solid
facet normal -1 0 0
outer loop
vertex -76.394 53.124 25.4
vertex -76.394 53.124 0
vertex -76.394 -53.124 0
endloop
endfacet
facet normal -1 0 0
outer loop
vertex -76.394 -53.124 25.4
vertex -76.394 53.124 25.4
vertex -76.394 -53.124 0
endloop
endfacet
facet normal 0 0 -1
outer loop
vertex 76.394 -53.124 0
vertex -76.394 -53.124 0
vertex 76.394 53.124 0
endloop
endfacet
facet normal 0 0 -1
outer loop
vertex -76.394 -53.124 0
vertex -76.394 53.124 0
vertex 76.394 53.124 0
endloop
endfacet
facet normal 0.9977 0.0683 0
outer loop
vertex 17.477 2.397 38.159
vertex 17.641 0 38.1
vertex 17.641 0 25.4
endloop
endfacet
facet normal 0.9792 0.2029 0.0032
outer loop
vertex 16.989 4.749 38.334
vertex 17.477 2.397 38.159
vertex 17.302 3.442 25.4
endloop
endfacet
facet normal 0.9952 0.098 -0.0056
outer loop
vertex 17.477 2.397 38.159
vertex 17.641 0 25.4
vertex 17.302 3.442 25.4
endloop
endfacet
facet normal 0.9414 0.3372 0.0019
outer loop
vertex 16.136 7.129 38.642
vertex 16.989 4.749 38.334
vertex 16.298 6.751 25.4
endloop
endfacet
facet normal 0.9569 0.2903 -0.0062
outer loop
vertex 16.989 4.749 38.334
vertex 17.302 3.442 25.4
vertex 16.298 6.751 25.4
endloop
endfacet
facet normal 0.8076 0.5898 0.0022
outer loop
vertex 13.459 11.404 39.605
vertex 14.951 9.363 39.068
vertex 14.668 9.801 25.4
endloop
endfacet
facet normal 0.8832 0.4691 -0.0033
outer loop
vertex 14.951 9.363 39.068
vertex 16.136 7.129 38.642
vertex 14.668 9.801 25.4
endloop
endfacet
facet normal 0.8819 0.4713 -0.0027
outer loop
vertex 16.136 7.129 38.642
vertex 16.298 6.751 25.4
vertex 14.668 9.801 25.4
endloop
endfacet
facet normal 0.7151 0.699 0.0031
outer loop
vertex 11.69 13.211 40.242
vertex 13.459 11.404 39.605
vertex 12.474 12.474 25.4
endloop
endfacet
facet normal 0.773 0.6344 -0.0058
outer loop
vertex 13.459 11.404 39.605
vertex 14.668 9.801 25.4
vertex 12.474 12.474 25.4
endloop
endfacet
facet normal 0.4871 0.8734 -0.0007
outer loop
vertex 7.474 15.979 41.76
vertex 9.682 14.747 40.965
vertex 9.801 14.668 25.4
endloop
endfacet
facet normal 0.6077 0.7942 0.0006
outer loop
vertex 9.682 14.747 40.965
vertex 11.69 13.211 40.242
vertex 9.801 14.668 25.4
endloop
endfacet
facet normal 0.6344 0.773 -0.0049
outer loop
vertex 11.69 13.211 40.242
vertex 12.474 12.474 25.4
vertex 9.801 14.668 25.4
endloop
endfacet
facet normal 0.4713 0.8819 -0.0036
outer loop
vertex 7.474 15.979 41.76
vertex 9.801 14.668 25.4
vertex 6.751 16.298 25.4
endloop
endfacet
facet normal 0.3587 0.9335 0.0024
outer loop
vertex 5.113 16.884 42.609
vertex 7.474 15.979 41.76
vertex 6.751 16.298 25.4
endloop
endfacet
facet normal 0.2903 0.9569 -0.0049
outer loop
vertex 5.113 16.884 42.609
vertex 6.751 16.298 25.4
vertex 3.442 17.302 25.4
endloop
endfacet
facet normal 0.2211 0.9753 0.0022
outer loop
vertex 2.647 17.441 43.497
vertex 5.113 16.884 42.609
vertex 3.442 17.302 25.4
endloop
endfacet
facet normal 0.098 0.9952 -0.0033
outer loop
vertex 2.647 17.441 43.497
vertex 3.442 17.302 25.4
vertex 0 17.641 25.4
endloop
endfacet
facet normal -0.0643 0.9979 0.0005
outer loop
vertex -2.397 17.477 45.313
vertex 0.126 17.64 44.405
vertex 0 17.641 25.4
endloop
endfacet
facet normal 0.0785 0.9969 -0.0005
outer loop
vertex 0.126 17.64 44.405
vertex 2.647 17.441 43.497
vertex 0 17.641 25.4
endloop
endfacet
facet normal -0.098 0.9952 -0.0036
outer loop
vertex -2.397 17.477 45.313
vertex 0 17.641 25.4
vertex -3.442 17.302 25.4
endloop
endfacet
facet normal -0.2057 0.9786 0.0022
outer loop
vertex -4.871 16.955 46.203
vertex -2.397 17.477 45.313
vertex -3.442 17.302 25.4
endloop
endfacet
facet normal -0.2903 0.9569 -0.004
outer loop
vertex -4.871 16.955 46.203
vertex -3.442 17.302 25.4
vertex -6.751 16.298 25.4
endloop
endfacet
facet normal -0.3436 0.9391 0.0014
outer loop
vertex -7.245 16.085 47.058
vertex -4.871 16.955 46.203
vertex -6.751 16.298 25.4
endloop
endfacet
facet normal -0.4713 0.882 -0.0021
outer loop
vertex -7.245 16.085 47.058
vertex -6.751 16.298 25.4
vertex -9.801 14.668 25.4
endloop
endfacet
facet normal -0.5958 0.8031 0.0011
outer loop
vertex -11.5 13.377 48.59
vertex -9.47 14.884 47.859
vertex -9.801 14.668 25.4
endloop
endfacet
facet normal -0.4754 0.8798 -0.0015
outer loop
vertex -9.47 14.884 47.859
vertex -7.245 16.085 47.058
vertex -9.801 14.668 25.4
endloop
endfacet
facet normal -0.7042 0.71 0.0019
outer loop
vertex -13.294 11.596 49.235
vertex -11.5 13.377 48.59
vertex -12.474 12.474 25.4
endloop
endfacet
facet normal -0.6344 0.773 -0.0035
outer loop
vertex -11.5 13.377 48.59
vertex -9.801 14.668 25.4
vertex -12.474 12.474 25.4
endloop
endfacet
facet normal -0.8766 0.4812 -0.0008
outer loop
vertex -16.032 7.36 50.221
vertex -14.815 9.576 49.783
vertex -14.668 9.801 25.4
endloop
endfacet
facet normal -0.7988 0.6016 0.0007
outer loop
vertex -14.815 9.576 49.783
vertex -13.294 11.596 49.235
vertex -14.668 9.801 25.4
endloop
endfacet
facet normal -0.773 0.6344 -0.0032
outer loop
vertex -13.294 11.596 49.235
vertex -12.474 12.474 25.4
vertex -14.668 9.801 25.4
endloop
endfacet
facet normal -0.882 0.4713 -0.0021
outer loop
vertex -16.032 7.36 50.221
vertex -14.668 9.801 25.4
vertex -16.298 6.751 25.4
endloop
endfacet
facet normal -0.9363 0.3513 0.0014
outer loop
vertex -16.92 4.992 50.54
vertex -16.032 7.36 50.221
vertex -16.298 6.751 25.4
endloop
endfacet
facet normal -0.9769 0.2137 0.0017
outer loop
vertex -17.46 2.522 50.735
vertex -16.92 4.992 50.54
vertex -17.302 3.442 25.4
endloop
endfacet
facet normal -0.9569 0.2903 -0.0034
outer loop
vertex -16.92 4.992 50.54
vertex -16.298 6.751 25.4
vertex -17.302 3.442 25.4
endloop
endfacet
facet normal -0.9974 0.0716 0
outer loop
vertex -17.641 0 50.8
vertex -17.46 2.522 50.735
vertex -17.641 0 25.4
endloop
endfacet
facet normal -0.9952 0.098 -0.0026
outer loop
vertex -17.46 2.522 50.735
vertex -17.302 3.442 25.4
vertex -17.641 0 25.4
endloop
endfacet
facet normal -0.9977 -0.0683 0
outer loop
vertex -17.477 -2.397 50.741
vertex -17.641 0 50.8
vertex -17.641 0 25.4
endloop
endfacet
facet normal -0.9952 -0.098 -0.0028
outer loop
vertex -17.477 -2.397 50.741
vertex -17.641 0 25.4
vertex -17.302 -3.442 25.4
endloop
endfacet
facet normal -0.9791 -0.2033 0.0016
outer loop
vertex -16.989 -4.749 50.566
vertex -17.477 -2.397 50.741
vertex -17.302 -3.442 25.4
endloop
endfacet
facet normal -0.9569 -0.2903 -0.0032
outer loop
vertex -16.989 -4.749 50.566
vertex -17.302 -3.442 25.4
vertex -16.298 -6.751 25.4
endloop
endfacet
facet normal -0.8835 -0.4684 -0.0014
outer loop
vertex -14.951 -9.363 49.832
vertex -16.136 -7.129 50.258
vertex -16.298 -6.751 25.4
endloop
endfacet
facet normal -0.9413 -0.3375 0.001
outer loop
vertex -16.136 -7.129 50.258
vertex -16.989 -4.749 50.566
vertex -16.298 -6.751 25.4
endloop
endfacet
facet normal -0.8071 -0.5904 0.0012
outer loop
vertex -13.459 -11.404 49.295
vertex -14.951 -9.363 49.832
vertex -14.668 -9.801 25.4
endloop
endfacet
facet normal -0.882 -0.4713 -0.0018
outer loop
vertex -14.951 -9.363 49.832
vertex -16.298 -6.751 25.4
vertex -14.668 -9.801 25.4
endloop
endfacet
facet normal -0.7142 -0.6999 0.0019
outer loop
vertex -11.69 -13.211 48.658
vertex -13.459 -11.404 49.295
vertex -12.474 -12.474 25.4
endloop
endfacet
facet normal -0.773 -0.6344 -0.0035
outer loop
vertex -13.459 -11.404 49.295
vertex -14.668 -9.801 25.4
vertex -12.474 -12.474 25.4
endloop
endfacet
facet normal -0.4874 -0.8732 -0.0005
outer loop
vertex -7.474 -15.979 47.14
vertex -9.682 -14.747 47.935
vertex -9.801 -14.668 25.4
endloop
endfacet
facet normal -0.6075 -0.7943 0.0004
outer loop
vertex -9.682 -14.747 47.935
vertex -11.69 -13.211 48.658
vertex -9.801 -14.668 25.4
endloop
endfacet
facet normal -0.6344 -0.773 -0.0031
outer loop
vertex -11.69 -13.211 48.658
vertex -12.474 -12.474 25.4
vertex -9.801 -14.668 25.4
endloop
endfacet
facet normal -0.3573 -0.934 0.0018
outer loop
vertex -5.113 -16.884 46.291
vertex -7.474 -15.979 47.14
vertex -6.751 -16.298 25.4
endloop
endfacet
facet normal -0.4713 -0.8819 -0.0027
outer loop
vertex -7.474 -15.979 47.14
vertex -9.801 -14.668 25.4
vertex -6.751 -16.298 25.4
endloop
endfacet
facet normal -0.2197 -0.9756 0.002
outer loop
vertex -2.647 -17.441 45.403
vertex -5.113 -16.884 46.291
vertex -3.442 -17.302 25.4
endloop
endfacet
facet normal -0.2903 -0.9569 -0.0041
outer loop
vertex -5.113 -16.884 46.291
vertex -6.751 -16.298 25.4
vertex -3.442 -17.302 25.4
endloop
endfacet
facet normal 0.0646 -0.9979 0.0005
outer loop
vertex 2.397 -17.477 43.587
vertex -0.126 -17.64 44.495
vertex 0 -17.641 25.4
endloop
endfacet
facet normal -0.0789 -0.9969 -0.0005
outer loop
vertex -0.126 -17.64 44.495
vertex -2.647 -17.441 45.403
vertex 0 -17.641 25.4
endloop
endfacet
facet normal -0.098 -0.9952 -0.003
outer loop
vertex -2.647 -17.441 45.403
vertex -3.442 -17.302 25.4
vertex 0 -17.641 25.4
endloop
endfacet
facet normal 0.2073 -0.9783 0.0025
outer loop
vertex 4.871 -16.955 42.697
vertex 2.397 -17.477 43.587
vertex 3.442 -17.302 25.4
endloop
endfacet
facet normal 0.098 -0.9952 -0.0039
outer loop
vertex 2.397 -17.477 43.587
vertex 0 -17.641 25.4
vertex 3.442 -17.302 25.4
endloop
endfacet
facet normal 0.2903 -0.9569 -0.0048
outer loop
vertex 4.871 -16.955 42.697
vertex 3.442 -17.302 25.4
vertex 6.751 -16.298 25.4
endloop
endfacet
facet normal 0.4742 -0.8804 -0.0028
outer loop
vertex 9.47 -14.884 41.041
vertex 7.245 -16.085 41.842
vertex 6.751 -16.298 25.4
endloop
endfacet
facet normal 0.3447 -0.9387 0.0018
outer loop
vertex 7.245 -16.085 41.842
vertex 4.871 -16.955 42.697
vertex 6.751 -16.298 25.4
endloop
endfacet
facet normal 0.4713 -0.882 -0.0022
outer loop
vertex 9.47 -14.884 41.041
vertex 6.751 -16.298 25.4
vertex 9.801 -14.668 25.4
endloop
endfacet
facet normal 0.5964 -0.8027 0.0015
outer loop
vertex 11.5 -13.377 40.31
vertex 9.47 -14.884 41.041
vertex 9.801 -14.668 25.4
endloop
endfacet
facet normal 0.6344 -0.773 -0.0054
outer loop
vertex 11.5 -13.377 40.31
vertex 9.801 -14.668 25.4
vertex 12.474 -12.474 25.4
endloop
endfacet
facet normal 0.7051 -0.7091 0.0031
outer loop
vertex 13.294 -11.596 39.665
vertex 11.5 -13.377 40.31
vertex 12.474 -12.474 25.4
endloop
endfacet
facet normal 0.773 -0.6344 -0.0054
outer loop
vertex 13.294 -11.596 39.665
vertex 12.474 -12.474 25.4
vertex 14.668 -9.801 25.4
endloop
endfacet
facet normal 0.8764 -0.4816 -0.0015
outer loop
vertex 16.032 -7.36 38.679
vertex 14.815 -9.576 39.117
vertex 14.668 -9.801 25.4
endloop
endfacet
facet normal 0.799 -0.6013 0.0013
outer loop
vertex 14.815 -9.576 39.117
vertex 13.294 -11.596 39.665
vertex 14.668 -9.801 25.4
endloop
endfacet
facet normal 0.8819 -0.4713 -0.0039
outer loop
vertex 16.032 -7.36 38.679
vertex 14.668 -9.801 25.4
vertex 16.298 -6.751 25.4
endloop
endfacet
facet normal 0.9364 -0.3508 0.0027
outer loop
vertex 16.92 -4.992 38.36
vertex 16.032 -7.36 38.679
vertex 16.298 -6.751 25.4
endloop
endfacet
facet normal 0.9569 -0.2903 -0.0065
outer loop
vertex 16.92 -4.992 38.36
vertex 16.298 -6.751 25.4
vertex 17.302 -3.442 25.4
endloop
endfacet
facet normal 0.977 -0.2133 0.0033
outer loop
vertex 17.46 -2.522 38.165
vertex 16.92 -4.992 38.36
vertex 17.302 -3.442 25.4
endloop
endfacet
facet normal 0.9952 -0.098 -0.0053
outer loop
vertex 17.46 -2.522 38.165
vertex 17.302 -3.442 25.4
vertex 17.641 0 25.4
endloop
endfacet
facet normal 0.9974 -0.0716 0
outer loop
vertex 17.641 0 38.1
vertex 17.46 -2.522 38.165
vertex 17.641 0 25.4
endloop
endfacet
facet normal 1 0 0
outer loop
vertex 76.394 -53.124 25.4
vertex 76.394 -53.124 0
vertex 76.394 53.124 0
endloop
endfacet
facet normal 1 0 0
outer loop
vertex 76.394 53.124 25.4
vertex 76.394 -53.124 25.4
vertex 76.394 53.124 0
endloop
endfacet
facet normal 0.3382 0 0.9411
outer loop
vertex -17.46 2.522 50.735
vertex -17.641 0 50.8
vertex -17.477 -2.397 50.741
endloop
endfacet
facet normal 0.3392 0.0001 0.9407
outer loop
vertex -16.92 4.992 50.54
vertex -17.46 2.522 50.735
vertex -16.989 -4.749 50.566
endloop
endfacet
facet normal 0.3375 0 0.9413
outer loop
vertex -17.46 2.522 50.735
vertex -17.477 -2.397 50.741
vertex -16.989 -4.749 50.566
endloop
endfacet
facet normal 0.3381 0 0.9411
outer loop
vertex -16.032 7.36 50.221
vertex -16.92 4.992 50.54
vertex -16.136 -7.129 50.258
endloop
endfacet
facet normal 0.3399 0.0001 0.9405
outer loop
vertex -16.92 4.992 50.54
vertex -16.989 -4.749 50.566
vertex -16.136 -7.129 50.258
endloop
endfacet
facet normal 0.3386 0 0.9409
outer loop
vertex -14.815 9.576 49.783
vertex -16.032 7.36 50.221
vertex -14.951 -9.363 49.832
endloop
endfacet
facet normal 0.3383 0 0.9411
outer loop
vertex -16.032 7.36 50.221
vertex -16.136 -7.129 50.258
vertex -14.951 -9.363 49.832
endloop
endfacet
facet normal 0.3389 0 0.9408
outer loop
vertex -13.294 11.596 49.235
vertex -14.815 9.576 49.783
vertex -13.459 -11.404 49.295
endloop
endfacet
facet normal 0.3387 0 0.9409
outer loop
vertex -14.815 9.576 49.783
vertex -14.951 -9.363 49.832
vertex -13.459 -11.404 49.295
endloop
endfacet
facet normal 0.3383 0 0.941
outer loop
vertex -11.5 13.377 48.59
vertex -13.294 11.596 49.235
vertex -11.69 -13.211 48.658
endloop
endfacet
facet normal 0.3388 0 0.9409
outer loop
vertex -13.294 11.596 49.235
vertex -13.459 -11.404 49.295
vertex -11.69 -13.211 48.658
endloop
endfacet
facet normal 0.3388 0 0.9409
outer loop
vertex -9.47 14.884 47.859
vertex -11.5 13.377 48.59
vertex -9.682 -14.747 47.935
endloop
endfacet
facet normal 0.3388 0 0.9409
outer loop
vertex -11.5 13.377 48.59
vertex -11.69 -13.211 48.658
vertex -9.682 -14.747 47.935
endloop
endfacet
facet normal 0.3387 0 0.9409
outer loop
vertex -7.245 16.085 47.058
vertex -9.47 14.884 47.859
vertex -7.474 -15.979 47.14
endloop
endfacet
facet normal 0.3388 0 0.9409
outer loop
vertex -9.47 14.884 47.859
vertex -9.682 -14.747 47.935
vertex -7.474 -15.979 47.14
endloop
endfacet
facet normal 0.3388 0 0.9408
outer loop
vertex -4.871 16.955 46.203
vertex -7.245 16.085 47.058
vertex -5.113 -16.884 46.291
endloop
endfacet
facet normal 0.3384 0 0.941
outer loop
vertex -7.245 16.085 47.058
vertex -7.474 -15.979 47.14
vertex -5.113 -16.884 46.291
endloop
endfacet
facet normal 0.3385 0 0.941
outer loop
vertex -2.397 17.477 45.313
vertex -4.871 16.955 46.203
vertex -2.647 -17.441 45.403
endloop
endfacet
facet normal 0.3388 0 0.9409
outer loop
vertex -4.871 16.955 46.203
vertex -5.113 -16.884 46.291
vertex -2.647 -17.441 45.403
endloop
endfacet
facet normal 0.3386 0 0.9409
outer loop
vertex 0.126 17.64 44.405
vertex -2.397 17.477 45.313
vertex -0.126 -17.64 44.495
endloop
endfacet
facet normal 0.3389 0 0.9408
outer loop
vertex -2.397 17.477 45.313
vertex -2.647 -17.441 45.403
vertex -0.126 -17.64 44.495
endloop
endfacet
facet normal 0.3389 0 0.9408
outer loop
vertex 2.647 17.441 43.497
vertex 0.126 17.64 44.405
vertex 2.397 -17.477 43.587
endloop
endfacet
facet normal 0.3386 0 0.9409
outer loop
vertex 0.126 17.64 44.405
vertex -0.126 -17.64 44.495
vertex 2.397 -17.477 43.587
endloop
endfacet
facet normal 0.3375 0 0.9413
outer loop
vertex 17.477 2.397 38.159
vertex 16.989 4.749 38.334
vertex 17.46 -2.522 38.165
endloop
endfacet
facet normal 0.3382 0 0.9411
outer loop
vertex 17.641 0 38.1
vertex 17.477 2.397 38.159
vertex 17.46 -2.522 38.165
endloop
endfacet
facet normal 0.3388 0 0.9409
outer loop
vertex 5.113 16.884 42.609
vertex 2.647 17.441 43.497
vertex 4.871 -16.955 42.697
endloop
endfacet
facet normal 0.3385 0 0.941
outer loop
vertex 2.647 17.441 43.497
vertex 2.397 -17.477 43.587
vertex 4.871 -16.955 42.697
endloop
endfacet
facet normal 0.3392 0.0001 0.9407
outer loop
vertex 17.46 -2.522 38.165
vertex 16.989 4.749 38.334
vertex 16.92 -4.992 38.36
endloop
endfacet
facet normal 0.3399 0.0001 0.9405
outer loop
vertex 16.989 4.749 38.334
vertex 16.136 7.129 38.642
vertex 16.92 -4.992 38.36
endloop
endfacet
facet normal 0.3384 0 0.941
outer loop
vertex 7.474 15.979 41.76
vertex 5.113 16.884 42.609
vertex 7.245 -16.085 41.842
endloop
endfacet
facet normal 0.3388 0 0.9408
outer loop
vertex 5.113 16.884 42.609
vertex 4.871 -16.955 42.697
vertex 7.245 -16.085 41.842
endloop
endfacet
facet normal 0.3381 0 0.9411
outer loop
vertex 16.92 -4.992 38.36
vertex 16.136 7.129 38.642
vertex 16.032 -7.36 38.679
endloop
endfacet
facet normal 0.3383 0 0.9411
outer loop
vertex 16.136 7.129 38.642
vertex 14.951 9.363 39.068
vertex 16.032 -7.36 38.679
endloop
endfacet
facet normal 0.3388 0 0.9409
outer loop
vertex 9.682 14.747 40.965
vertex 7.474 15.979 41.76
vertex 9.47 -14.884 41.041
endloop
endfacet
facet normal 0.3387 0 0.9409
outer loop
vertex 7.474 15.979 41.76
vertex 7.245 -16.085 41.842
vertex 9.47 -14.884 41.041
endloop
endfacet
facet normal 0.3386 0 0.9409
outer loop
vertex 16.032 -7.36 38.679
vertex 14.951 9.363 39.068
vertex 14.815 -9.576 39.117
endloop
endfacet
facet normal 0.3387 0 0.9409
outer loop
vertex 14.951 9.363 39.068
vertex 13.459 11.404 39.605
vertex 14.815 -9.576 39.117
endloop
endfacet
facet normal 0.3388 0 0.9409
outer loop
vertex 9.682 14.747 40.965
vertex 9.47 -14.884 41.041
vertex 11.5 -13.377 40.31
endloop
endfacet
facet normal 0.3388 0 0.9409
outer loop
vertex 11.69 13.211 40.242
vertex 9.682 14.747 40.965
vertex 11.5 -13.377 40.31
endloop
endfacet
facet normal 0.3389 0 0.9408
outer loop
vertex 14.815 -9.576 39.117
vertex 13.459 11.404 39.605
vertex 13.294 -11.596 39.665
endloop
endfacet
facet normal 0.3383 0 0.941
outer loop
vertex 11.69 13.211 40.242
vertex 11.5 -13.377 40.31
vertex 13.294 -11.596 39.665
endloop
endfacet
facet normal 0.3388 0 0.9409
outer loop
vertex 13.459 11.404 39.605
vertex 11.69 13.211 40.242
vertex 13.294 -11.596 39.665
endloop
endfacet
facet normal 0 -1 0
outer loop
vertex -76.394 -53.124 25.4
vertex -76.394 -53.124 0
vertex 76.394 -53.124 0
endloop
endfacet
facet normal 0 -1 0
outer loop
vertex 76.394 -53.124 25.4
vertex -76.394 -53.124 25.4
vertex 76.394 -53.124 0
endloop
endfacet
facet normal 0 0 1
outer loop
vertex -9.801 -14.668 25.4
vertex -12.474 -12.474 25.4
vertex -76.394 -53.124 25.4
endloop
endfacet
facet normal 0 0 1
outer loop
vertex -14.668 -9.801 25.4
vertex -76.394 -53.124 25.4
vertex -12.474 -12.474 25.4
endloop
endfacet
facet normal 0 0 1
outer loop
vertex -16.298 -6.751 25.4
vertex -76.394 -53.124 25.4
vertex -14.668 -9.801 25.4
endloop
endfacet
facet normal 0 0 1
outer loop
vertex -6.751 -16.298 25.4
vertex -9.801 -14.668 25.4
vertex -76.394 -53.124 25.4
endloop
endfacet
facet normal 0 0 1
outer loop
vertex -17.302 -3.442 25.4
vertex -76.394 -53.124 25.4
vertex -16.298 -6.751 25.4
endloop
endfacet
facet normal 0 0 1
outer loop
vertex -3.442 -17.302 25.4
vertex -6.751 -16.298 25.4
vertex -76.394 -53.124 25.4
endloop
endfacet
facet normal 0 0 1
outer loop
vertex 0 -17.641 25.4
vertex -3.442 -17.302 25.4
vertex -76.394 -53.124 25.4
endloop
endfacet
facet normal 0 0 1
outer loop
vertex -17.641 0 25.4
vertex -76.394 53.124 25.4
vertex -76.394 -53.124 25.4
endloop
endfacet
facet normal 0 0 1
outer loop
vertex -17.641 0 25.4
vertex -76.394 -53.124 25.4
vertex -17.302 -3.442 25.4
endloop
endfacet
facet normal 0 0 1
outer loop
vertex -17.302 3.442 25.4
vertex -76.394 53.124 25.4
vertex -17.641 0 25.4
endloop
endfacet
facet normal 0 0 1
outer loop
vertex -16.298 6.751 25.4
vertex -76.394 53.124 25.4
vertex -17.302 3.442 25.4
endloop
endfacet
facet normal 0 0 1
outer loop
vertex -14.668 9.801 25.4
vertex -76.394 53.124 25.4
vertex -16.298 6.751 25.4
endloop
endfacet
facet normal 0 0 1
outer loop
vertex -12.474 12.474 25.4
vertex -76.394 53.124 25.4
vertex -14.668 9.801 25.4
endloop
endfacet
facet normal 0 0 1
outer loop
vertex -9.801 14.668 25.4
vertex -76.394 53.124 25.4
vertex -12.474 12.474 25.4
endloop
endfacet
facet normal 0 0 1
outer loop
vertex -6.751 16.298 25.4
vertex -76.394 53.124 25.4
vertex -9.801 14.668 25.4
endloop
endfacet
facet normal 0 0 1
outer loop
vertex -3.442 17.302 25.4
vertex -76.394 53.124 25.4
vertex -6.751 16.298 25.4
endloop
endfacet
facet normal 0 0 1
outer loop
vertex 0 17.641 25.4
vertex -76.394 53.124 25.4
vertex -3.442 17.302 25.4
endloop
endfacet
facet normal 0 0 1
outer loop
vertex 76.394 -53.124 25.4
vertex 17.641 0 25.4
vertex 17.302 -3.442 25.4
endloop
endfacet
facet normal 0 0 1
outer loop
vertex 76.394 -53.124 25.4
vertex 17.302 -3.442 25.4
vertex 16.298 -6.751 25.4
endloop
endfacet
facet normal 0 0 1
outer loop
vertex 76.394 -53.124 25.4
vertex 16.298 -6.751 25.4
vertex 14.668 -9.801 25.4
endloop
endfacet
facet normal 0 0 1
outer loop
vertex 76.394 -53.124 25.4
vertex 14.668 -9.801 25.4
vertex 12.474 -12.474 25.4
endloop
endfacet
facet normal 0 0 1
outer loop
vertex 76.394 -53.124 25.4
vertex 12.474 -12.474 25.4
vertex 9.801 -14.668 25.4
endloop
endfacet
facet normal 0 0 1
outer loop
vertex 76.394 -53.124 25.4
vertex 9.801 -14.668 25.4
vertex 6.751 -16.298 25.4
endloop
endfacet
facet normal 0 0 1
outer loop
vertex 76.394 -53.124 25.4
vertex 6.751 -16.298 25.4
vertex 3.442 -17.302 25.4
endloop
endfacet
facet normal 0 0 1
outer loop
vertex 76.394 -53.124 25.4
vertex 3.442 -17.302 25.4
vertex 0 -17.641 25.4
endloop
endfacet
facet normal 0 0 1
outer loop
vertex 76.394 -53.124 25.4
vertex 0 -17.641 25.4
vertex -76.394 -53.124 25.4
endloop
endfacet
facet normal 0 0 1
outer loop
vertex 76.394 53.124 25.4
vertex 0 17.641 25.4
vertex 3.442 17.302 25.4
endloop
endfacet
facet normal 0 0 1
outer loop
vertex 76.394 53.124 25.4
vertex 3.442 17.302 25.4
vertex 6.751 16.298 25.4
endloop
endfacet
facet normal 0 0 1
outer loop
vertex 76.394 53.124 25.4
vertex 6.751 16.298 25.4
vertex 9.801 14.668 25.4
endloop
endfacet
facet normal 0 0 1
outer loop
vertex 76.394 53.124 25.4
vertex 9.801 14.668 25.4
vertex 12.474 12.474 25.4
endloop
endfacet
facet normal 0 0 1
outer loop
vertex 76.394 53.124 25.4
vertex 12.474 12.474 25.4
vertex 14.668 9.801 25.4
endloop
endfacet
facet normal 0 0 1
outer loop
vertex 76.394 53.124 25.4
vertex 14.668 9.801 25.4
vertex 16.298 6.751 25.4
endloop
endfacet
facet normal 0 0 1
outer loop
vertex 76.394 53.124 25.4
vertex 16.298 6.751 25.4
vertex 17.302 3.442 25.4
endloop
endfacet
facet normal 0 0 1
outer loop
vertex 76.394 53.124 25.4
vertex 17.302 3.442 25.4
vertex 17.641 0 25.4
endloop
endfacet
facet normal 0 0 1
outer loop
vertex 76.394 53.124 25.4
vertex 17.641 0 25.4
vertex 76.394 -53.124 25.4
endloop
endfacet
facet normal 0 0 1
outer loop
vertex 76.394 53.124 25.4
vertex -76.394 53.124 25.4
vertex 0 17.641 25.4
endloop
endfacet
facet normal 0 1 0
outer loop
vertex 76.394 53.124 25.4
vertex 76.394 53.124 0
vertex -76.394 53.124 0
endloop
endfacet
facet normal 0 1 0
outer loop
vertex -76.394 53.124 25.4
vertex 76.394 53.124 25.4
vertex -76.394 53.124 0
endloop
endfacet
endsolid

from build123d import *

# Parameters (mm, degrees)
F2_DEPTH = 25.4
F1_R     = 17.640779
F3_DEPTH = 50.8
F5_DEPTH = 106.248343


with BuildPart() as f2:
    # F0 (on Top) → F2 (new body)
    with BuildSketch(Plane.XY):
        Polygon((-76.394252, 49.22979), (-76.394252, -53.123672), (76.394252, -53.123672), (76.394252, 53.123672), (-76.394252, 53.123672), align=None)
    extrude(amount=F2_DEPTH)

    # F1 (on Top) → F3 (join)
    with BuildSketch(Plane.XY):
        Circle(F1_R)
    extrude(amount=F3_DEPTH)

    # F4 (on face) → F5 (cut, through all)
    with BuildSketch(Plane.XZ.offset(53.123672)):
        Polygon((17.640779, 50.8), (-17.640779, 50.8), (17.640779, 38.1), align=None)
    extrude(amount=-F5_DEPTH, mode=Mode.SUBTRACT)


solid = f2.part
